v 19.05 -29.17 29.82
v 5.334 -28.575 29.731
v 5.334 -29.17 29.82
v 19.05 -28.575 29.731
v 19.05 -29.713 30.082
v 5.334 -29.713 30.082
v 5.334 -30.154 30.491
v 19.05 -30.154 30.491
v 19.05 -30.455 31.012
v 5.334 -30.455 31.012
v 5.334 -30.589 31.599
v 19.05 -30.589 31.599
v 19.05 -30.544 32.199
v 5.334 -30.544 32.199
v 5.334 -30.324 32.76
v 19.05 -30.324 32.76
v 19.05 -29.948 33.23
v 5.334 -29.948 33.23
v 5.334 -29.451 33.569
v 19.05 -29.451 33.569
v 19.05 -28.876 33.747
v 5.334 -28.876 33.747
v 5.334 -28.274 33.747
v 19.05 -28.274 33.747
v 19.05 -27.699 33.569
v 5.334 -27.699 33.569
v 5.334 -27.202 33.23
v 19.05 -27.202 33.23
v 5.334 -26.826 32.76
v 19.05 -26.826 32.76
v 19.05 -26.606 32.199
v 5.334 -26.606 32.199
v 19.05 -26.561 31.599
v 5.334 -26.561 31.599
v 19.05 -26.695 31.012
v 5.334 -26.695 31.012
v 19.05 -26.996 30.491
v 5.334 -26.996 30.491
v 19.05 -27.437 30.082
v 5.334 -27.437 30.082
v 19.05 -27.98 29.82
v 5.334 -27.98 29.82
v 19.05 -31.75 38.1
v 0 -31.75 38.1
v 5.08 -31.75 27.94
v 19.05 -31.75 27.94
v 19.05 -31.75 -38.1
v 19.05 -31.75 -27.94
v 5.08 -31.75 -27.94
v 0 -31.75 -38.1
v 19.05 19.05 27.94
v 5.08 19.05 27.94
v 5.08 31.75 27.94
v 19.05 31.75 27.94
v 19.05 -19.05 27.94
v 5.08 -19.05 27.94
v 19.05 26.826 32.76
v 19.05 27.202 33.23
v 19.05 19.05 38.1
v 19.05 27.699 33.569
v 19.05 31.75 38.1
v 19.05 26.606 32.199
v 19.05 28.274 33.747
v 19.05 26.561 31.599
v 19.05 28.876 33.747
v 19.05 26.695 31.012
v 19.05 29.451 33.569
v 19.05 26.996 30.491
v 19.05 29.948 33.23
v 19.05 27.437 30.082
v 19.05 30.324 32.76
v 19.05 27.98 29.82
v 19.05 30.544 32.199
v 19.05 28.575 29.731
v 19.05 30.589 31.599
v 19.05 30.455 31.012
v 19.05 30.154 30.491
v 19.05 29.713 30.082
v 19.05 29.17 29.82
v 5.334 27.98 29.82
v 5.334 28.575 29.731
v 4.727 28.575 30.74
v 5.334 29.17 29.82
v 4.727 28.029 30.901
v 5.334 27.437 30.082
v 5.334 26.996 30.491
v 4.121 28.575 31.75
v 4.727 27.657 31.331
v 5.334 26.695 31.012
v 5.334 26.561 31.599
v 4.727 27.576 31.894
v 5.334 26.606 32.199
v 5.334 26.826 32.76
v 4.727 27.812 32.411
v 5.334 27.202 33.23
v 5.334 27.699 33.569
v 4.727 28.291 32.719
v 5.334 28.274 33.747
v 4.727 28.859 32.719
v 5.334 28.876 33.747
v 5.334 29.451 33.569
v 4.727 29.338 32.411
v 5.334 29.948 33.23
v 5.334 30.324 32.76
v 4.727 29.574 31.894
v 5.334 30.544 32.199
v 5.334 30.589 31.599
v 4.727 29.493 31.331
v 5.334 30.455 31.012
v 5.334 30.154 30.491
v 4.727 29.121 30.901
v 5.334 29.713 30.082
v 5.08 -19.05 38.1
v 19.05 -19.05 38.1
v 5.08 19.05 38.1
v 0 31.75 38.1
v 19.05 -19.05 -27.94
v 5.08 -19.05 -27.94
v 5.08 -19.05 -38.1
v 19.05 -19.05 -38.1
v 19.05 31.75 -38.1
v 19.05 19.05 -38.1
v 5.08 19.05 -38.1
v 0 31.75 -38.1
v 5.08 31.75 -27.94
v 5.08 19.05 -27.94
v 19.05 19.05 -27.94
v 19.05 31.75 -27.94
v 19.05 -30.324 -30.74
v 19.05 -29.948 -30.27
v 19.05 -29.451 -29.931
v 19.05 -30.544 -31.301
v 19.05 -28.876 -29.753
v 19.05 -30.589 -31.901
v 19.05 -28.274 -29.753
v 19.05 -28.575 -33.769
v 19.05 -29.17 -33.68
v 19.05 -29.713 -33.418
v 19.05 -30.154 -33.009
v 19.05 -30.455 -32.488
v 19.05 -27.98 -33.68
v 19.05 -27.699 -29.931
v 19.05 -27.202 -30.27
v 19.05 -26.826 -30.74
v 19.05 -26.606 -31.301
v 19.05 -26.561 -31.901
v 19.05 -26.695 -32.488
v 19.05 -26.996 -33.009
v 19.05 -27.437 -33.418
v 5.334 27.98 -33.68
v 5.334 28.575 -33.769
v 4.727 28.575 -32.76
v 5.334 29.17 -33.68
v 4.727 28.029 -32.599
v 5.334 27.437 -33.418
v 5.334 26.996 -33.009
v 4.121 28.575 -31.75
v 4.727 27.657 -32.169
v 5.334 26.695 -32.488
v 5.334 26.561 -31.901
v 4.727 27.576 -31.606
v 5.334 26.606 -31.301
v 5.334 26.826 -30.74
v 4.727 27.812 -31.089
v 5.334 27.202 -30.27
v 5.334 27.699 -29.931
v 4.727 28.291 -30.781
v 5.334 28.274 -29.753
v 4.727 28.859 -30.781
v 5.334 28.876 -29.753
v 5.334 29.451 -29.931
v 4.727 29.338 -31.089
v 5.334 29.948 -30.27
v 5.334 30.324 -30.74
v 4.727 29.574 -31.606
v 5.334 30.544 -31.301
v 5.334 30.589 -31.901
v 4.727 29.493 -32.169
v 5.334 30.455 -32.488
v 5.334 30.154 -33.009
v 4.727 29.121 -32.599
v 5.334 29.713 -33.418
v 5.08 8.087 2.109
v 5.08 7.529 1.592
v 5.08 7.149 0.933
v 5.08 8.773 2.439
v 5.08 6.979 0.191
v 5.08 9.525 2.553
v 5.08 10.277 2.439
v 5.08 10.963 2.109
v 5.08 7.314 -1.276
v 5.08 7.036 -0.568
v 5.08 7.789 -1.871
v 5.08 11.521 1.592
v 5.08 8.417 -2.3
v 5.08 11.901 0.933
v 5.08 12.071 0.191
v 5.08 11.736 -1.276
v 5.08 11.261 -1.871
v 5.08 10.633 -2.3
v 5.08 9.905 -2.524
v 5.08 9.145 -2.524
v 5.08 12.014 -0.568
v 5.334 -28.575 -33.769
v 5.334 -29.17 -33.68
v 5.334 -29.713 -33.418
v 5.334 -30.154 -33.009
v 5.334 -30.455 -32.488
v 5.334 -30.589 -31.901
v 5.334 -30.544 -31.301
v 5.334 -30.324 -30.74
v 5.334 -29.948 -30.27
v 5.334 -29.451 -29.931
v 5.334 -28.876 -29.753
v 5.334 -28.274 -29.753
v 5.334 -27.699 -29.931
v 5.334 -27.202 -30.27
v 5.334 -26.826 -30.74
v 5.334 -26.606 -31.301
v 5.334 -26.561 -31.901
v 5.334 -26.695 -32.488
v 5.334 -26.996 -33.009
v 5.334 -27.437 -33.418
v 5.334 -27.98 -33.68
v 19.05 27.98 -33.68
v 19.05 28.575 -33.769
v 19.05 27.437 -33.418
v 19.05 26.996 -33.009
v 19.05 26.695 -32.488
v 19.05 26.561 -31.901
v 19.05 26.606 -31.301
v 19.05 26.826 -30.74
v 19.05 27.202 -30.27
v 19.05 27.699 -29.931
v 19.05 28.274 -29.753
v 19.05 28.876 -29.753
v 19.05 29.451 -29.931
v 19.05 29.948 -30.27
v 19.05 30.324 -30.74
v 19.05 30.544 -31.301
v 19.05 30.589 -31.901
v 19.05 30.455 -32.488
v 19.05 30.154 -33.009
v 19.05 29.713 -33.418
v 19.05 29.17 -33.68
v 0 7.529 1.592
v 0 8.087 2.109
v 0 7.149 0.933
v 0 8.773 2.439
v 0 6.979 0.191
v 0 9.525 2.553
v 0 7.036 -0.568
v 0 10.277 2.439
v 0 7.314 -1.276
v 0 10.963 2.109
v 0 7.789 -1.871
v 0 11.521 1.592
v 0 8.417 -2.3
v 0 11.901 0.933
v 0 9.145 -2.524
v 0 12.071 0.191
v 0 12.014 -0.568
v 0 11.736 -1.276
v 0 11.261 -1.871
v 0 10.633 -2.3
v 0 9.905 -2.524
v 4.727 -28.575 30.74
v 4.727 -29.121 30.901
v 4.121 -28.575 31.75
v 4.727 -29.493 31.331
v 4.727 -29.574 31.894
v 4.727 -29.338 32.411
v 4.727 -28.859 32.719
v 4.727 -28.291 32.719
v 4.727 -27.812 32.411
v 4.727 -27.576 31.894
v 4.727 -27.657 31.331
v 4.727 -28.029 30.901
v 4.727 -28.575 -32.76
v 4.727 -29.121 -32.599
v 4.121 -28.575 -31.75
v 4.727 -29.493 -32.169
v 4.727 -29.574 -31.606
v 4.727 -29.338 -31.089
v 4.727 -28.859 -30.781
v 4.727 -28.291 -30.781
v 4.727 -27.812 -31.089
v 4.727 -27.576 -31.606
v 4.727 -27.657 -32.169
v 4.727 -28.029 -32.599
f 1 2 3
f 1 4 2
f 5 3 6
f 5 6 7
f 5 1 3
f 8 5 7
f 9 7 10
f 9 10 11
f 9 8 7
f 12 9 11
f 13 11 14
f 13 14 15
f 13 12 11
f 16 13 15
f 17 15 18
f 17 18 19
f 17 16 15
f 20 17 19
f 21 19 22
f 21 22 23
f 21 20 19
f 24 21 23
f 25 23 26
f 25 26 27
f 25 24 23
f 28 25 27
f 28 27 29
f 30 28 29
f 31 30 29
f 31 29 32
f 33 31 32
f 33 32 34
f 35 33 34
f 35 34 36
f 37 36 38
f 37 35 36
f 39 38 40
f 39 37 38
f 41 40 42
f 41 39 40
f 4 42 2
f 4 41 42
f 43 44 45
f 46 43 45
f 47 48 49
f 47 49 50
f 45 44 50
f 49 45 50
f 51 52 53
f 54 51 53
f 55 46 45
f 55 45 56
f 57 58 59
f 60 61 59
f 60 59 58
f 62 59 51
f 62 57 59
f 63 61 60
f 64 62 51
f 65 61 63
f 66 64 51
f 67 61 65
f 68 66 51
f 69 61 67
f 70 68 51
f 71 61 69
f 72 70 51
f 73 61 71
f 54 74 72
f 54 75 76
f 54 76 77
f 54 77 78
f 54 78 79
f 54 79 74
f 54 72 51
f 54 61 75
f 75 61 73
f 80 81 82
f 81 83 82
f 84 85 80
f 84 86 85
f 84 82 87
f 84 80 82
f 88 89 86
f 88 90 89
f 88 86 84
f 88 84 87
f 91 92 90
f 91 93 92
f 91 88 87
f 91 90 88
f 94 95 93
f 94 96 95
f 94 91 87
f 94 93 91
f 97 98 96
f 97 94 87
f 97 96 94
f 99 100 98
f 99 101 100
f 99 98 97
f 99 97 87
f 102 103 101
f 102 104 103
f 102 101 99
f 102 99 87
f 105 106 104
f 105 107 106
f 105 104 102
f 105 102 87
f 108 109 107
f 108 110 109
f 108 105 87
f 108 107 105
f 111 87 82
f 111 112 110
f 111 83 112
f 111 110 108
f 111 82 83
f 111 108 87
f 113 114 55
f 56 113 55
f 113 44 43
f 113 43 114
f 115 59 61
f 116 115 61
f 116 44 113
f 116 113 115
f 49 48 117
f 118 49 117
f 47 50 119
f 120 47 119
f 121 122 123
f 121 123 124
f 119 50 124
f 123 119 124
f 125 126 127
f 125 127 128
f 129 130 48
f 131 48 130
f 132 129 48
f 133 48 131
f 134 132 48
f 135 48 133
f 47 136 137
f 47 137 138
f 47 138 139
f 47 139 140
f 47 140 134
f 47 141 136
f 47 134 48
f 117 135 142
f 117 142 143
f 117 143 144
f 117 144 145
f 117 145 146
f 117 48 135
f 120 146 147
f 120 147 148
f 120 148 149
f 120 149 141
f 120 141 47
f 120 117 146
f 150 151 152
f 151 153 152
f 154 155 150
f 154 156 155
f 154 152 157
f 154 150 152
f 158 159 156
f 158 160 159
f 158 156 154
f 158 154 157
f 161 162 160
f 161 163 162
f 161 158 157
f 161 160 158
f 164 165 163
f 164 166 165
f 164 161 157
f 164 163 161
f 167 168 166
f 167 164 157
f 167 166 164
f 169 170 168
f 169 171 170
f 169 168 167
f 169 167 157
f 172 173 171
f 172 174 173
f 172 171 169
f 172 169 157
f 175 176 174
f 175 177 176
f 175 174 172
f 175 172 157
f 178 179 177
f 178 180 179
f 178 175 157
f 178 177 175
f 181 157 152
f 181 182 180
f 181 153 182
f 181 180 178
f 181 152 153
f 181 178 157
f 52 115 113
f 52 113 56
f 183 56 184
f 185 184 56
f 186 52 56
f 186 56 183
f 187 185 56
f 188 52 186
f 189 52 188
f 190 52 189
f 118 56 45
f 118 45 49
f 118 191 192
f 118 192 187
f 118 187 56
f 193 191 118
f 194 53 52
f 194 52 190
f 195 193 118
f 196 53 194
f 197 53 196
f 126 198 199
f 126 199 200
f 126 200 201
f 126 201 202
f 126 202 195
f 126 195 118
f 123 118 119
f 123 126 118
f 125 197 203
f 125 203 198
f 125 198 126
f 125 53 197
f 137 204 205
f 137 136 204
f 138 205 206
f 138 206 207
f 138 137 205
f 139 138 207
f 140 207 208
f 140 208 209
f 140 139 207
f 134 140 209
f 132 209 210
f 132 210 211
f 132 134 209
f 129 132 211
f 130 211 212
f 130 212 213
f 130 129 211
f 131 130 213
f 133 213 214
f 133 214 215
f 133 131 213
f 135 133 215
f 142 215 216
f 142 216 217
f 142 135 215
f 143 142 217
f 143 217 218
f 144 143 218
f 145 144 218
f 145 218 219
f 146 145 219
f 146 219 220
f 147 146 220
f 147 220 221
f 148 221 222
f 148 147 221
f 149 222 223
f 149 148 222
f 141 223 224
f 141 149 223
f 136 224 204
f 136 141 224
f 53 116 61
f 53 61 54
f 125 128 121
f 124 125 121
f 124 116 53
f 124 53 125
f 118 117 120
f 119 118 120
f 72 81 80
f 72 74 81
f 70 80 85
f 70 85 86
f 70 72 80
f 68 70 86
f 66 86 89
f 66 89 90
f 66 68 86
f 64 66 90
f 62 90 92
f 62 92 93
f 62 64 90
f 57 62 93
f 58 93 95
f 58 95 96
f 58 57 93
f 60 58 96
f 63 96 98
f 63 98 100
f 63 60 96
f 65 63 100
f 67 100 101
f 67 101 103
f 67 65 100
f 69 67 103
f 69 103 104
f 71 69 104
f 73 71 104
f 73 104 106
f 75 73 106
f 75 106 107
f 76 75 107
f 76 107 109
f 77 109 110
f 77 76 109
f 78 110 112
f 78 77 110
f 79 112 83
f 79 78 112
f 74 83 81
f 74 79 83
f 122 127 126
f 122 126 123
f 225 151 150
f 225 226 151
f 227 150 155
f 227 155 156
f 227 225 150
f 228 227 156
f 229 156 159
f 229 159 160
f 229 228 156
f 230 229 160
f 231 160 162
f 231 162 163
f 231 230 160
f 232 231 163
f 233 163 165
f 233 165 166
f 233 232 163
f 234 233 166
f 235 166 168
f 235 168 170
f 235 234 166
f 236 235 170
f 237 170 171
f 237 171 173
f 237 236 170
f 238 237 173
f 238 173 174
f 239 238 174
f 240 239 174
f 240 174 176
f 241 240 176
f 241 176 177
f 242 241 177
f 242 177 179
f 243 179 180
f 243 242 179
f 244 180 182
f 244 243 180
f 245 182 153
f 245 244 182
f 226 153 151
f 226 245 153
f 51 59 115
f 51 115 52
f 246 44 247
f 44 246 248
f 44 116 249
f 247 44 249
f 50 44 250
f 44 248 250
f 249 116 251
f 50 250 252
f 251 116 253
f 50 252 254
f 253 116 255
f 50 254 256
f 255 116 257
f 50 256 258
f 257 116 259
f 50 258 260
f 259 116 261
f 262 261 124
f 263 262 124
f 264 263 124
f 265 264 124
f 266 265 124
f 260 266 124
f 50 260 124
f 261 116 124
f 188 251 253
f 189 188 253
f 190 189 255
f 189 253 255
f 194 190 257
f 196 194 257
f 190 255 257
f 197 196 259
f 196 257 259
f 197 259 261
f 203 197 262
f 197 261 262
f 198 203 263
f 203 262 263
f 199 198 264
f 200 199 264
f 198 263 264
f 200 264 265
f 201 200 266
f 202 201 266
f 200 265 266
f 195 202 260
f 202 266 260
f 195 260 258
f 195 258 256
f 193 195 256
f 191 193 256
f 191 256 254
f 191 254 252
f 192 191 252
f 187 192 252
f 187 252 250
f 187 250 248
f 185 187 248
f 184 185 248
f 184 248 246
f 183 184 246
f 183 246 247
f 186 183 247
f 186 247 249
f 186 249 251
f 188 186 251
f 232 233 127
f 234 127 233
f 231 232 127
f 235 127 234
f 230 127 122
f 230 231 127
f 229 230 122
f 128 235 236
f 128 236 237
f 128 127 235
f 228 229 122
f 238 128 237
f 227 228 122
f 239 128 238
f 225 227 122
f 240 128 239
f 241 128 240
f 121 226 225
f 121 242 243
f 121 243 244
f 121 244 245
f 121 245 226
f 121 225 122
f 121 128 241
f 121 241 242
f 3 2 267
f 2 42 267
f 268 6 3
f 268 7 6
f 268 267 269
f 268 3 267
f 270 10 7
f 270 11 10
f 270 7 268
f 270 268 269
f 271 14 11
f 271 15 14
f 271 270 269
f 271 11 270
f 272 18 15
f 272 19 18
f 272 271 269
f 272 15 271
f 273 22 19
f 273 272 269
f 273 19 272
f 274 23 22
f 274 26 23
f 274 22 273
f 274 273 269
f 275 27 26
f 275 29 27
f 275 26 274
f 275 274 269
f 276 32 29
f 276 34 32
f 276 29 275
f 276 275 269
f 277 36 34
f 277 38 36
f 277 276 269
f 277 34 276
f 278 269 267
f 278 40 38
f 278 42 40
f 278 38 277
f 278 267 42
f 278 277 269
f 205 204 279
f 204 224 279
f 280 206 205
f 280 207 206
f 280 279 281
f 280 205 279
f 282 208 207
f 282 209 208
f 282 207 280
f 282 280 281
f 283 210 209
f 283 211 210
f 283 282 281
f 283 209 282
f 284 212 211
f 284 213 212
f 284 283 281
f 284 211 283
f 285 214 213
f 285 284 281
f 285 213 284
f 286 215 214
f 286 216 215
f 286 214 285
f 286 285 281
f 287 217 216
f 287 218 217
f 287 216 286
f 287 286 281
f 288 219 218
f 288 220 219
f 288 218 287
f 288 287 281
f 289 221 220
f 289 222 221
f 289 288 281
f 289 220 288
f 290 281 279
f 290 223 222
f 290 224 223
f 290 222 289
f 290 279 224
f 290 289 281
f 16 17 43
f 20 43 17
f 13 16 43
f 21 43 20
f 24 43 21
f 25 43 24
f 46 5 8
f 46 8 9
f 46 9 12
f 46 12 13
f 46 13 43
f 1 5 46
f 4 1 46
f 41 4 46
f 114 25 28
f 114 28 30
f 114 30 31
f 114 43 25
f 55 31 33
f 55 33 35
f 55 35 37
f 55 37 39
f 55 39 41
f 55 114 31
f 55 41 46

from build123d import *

# Parameters (mm, degrees)
SKETCH1_W                   = 76.2
SKETCH1_H                   = 63.5
BOSS_EXTRUDE1_DEPTH         = 19.05
SKETCH2_W                   = 55.88
SKETCH2_H                   = 63.5
CUT_EXTRUDE1_DEPTH          = 13.97
F_1_4_20_TAPPED_HOLE1_D     = 5.1054
F_1_4_20_TAPPED_HOLE1_DEPTH = 19.05
F_1_4_20_TAPPED_HOLE1_TIP   = 1.533816902
LPATTERN1_COUNT             = 2
LPATTERN1_PITCH             = 57.15
LPATTERN1_COUNT_DIR2        = 2
LPATTERN1_PITCH_DIR2        = 63.5
SKETCH7_W                   = 76.2
SKETCH7_H                   = 38.1
CUT_EXTRUDE2_DEPTH          = 13.97


with BuildPart() as part:
    # Sketch1 → Boss-Extrude1 (new body)
    with BuildSketch(Plane(origin=(0, 0, 0), x_dir=(0, 0, -1), z_dir=(1, 0, 0))):
        Rectangle(SKETCH1_W, SKETCH1_H)
    extrude(amount=BOSS_EXTRUDE1_DEPTH)

    # Sketch2 → Cut-Extrude1 (cut)
    with BuildSketch(Plane(origin=(19.05, 0, 0), x_dir=(0, 0, -1), z_dir=(1, 0, 0))):
        Rectangle(SKETCH2_W, SKETCH2_H)
    extrude(amount=-CUT_EXTRUDE1_DEPTH, mode=Mode.SUBTRACT)

    # Sketch5 → #10-32 Tapped Hole1 (revolve, cut)
    with BuildSketch(Plane(origin=(19.05, 28.575, 31.75), x_dir=(0, 0, -1), z_dir=(0, 1, 0))):
        Polygon((0, 0), (0, 14.929317848), (2.0193, 13.716), (2.0193, 0), align=None)
    f_10_32_tapped_hole1 = revolve(axis=Axis((25.4, 28.575, 31.75), (-1, 0, 0)), mode=Mode.SUBTRACT)

    # 1/4-20 Tapped Hole1
    with Locations(Plane(origin=(5.08, 0, 0), x_dir=(0, 0, -1), z_dir=(1, 0, 0))):
        with Locations((0, 9.525)):
            Hole(F_1_4_20_TAPPED_HOLE1_D / 2, depth=F_1_4_20_TAPPED_HOLE1_DEPTH)
            with Locations((0, 0, -(F_1_4_20_TAPPED_HOLE1_DEPTH + F_1_4_20_TAPPED_HOLE1_TIP / 2))):  # 118° drill point
                Cone(0, F_1_4_20_TAPPED_HOLE1_D / 2, F_1_4_20_TAPPED_HOLE1_TIP, mode=Mode.SUBTRACT)

    # LPattern1: 10-32 Tapped Hole1 2 × 2
    with Locations(*[(0, -i * LPATTERN1_PITCH, -j * LPATTERN1_PITCH_DIR2) for i in range(LPATTERN1_COUNT) for j in range(LPATTERN1_COUNT_DIR2) if (i, j) != (0, 0)]):
        add(f_10_32_tapped_hole1, mode=Mode.SUBTRACT)

    # Sketch7 → Cut-Extrude2 (cut)
    with BuildSketch(Plane(origin=(19.05, 0, 0), x_dir=(0, 0, -1), z_dir=(1, 0, 0))):
        Rectangle(SKETCH7_W, SKETCH7_H)
    extrude(amount=-CUT_EXTRUDE2_DEPTH, mode=Mode.SUBTRACT)


solid = part.part
